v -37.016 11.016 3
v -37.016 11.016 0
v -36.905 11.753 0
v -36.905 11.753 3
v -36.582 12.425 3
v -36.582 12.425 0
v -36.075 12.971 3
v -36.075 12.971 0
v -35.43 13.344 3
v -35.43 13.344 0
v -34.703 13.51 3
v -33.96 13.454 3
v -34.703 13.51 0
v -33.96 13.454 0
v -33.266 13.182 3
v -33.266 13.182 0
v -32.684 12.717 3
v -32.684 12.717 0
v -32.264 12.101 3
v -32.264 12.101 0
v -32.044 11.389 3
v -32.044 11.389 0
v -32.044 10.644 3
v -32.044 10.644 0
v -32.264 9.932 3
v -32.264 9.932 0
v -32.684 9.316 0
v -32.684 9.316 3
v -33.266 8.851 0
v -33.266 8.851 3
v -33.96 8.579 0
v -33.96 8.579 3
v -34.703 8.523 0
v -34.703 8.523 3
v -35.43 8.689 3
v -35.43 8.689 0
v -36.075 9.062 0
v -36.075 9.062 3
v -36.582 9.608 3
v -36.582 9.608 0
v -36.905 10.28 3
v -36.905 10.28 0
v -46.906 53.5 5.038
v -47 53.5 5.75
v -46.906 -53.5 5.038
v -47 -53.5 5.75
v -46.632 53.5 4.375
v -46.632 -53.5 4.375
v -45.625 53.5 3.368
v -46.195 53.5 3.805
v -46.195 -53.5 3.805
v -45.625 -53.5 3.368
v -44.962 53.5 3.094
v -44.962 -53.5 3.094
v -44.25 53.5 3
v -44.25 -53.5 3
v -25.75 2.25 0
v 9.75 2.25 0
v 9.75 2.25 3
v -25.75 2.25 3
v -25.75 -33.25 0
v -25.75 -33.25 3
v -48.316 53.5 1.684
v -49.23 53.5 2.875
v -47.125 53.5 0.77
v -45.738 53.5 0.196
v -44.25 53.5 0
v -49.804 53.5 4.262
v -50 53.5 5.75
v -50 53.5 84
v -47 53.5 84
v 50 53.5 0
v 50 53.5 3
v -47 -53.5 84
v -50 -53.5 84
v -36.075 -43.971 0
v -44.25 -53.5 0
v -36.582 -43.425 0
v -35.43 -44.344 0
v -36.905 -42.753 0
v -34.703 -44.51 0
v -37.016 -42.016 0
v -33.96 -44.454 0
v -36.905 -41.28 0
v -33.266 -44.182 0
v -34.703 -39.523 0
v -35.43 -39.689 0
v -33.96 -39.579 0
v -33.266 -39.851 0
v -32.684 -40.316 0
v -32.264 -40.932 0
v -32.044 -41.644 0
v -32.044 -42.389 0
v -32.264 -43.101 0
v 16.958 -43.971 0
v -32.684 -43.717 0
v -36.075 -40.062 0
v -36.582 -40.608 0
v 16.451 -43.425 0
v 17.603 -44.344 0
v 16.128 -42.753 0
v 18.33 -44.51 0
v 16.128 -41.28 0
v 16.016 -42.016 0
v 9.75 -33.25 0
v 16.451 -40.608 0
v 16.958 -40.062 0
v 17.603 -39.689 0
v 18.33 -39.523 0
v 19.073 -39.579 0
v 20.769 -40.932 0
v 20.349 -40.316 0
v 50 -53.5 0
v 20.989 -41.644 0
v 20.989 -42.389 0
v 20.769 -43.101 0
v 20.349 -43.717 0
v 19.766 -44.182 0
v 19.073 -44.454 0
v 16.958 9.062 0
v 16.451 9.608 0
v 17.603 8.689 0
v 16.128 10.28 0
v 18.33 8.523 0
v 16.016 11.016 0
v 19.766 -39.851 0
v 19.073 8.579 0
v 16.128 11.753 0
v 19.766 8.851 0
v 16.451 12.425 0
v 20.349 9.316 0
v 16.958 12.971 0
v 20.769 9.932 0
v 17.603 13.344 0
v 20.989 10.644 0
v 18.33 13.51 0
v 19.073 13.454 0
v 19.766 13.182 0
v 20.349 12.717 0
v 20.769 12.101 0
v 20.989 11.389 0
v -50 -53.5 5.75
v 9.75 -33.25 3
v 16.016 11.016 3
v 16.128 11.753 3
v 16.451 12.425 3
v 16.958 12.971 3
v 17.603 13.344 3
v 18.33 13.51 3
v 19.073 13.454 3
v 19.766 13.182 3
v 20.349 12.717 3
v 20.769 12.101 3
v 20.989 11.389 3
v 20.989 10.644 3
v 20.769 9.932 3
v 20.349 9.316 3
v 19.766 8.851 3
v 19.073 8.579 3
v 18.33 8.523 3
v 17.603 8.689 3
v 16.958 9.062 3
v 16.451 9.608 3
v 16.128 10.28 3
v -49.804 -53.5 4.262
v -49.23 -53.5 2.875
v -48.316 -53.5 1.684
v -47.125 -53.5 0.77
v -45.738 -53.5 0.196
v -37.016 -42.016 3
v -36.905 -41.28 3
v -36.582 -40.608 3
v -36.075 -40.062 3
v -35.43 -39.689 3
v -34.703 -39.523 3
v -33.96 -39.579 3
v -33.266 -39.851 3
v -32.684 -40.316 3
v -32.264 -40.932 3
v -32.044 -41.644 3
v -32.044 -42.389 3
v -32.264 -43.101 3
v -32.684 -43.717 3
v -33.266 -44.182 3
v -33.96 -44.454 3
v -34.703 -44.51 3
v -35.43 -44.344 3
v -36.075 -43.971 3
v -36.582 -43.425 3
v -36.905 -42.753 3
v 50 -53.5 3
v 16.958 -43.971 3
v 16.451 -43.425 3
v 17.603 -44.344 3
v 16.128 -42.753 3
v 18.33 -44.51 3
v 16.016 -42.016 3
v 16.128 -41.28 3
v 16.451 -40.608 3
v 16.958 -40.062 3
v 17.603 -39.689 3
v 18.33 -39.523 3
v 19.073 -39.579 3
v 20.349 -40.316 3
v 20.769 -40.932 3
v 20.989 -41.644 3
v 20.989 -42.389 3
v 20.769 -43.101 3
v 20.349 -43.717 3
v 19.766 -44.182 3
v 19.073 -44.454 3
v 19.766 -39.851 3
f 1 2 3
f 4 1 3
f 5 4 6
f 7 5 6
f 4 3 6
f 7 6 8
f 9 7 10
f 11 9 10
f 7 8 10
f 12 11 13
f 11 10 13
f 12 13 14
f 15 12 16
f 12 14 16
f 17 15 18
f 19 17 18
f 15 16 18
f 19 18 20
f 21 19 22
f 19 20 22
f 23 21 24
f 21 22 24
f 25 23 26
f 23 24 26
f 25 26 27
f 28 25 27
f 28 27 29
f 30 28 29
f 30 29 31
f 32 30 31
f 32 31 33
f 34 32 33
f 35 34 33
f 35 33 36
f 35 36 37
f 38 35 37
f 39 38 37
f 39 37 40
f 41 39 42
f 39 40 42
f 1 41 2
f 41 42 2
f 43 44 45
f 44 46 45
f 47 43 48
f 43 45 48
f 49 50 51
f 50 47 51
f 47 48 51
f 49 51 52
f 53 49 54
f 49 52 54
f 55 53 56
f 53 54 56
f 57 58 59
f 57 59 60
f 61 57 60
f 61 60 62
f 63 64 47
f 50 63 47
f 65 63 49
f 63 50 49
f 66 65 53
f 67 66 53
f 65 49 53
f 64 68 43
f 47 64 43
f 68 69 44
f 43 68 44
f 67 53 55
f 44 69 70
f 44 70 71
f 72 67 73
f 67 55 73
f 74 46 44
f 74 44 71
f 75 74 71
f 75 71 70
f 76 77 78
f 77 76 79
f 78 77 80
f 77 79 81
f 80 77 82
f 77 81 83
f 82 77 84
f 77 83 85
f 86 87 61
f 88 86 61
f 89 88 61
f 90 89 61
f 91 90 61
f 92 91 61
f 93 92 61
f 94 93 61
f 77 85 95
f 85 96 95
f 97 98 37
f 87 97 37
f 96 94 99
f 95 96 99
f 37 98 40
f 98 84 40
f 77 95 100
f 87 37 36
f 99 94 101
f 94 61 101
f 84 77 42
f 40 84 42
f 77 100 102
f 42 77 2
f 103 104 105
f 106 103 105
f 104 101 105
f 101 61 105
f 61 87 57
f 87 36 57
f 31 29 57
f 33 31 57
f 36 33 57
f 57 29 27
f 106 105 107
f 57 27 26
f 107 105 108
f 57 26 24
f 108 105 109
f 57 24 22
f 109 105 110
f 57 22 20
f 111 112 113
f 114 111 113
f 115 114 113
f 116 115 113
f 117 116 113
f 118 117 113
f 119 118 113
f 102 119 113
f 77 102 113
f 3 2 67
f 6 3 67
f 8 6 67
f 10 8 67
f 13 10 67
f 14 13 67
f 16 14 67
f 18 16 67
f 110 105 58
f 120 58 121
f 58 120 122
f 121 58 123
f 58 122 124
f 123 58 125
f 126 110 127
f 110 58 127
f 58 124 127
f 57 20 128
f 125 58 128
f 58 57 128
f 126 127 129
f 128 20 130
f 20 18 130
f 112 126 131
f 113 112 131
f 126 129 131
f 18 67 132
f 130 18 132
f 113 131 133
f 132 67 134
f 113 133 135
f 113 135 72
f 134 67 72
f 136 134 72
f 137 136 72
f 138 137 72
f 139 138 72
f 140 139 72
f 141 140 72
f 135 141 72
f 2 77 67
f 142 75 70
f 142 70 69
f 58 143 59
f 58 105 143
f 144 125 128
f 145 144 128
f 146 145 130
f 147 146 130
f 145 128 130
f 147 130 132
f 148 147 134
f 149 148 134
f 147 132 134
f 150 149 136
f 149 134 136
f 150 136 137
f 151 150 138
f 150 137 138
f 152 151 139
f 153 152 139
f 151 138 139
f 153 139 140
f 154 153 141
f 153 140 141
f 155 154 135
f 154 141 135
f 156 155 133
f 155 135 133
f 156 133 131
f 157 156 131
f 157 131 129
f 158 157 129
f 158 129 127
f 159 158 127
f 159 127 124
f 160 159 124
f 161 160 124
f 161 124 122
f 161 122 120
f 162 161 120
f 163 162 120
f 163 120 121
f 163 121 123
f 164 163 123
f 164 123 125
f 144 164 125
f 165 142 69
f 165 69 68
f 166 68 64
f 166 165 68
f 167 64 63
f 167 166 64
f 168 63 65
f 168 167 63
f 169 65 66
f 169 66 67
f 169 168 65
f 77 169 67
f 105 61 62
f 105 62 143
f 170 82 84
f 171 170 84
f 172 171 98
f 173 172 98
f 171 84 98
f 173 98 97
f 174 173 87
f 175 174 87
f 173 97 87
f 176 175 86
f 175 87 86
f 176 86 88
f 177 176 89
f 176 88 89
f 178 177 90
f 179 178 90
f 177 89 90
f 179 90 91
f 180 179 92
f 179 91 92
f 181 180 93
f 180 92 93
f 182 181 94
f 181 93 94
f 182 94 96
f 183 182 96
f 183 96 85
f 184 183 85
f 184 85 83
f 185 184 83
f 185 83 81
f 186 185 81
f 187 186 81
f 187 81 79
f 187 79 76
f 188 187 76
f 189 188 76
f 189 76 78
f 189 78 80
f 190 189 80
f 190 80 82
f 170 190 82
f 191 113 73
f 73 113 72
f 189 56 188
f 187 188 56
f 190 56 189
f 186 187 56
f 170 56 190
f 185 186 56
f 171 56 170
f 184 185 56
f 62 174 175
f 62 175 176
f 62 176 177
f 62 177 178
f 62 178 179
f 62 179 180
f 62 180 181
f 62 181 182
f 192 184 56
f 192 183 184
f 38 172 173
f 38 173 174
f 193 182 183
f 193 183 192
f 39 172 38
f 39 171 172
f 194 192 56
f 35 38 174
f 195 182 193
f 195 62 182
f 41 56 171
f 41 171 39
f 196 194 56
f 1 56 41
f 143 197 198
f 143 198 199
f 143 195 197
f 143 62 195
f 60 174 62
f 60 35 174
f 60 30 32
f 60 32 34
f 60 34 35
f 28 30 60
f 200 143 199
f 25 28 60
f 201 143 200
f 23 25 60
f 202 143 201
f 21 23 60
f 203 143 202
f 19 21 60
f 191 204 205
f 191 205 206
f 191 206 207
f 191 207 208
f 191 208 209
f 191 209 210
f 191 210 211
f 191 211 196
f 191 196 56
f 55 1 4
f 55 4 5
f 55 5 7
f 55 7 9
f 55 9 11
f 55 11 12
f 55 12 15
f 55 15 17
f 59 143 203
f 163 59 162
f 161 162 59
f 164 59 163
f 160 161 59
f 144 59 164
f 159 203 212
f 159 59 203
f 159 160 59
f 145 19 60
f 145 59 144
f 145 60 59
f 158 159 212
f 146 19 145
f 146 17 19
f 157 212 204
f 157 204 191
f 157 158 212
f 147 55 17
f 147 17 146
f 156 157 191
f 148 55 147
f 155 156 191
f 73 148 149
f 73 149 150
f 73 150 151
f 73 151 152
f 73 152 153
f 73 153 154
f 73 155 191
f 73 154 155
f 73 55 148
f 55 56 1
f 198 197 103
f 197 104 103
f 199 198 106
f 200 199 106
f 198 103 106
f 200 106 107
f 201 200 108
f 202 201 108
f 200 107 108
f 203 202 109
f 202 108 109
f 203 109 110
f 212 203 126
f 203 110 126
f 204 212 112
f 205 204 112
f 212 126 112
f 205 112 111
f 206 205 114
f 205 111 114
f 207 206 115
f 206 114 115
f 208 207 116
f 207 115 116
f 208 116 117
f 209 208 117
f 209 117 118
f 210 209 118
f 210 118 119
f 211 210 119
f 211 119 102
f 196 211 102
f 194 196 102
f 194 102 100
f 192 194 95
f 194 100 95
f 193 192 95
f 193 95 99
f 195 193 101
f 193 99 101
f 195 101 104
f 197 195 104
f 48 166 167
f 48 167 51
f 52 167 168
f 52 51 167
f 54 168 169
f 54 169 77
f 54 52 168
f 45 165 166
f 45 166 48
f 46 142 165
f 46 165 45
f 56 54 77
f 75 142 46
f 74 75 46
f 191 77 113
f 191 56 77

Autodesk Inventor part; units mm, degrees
ref_plane "YZ Plane" through (0, 0, 0) normal (1, 0, 0) x (0, 1, 0)
ref_plane "XZ Plane" through (0, 0, 0) normal (0, 1, 0) x (-1, 0, 0)
ref_plane "XY Plane" through (0, 0, 0) normal (0, 0, 1) x (1, 0, 0)
sketch "Sketch1" plane through (0, 0, 0) normal (0, 0, 1) x (1, 0, 0)
  line L0 (-50, -53.5) -> (50, -53.5)
  line L1 (50, -53.5) -> (50, 53.5)
  line L2 (50, 53.5) -> (-50, 53.5)
  line L3 (-50, 53.5) -> (-50, -53.5)
  line L4 (-50, -53.5) -> (50, 53.5) construction
  line L5 (50, -53.5) -> (-50, 53.5) construction
  point P0 (0, 0)
  dimension "d154" = 100
  dimension "d155" = 107
extrude "Plate5" add sketch "Sketch1" along normal blind 3
sketch "Sketch9" plane through (0, 0, 0) normal (0, 0, -1) x (-1, 0, 0)
  line L0 (25.75, -33.25) -> (-9.75, -33.25)
  line L1 (-9.75, -33.25) -> (-9.75, 2.25)
  line L2 (-9.75, 2.25) -> (25.75, 2.25)
  line L3 (25.75, 2.25) -> (25.75, -33.25)
  line L4 (25.75, -33.25) -> (-9.75, 2.25) construction
  line L5 (-9.75, -33.25) -> (25.75, 2.25) construction
  circle A0 centre (34.5165, -42.0165) radius 2.5
  circle A1 centre (-18.5165, -42.0165) radius 2.5
  circle A2 centre (-18.5165, 11.0165) radius 2.5
  circle A3 centre (34.5165, 11.0165) radius 2.5
  circle A4 centre (8, -15.5) radius 37.5 construction
  line L6 (-9.75, -33.25) -> (-18.5165, -42.0165) construction
  line L7 (50, 53.5) -> (50, -53.5) projected
  line L8 (-50, -53.5) -> (-50, 53.5) projected
  line L9 (50, -53.5) -> (-50, -53.5) projected
  line L10 (50, 53.5) -> (50, -53.5) projected
  line L11 (-50, 53.5) -> (50, 53.5) projected
  point P0 (0, 0)
  dimension "d173" = 35.5
  dimension "d174" = 35.5
  dimension "d175" = 5
  dimension "d176" = 12.3977
  dimension "d179" = 42
  dimension "d180" = 69
  dimension "d183" = 75
extrude "Extrusion3" cut sketch "Sketch9" against normal blind 10 contours L0 L1 L2 L3 | A0 | A1 | A2 | A3
sketch "Sketch7" plane through (-47, -53.5, 0) normal (-1, 0, 0) x (0, -1, 0)
  line L0 (-107, 0) -> (0, 0)
  line L1 (0, 0) -> (0, 84)
  line L2 (0, 84) -> (-107, 84)
  line L3 (-107, 84) -> (-107, 0)
edge flange "Flange3" height 84 angle 90 thickness 3 bend radius 2.75 thickness toward (-1, 0, 0) relief round relief width 3 relief depth 1.5 edges at (-50, 0, 3) wall of the first edge with corners at (-47, 53.5, 0) (-47, -53.5, 0) (-47, -53.5, 84) (-47, 53.5, 84)
bend "Bend3"
corner "Corner3"
properties part number "PNS 753 FDS 1200 FLANGE 2 up" material "Stainless Steel"
